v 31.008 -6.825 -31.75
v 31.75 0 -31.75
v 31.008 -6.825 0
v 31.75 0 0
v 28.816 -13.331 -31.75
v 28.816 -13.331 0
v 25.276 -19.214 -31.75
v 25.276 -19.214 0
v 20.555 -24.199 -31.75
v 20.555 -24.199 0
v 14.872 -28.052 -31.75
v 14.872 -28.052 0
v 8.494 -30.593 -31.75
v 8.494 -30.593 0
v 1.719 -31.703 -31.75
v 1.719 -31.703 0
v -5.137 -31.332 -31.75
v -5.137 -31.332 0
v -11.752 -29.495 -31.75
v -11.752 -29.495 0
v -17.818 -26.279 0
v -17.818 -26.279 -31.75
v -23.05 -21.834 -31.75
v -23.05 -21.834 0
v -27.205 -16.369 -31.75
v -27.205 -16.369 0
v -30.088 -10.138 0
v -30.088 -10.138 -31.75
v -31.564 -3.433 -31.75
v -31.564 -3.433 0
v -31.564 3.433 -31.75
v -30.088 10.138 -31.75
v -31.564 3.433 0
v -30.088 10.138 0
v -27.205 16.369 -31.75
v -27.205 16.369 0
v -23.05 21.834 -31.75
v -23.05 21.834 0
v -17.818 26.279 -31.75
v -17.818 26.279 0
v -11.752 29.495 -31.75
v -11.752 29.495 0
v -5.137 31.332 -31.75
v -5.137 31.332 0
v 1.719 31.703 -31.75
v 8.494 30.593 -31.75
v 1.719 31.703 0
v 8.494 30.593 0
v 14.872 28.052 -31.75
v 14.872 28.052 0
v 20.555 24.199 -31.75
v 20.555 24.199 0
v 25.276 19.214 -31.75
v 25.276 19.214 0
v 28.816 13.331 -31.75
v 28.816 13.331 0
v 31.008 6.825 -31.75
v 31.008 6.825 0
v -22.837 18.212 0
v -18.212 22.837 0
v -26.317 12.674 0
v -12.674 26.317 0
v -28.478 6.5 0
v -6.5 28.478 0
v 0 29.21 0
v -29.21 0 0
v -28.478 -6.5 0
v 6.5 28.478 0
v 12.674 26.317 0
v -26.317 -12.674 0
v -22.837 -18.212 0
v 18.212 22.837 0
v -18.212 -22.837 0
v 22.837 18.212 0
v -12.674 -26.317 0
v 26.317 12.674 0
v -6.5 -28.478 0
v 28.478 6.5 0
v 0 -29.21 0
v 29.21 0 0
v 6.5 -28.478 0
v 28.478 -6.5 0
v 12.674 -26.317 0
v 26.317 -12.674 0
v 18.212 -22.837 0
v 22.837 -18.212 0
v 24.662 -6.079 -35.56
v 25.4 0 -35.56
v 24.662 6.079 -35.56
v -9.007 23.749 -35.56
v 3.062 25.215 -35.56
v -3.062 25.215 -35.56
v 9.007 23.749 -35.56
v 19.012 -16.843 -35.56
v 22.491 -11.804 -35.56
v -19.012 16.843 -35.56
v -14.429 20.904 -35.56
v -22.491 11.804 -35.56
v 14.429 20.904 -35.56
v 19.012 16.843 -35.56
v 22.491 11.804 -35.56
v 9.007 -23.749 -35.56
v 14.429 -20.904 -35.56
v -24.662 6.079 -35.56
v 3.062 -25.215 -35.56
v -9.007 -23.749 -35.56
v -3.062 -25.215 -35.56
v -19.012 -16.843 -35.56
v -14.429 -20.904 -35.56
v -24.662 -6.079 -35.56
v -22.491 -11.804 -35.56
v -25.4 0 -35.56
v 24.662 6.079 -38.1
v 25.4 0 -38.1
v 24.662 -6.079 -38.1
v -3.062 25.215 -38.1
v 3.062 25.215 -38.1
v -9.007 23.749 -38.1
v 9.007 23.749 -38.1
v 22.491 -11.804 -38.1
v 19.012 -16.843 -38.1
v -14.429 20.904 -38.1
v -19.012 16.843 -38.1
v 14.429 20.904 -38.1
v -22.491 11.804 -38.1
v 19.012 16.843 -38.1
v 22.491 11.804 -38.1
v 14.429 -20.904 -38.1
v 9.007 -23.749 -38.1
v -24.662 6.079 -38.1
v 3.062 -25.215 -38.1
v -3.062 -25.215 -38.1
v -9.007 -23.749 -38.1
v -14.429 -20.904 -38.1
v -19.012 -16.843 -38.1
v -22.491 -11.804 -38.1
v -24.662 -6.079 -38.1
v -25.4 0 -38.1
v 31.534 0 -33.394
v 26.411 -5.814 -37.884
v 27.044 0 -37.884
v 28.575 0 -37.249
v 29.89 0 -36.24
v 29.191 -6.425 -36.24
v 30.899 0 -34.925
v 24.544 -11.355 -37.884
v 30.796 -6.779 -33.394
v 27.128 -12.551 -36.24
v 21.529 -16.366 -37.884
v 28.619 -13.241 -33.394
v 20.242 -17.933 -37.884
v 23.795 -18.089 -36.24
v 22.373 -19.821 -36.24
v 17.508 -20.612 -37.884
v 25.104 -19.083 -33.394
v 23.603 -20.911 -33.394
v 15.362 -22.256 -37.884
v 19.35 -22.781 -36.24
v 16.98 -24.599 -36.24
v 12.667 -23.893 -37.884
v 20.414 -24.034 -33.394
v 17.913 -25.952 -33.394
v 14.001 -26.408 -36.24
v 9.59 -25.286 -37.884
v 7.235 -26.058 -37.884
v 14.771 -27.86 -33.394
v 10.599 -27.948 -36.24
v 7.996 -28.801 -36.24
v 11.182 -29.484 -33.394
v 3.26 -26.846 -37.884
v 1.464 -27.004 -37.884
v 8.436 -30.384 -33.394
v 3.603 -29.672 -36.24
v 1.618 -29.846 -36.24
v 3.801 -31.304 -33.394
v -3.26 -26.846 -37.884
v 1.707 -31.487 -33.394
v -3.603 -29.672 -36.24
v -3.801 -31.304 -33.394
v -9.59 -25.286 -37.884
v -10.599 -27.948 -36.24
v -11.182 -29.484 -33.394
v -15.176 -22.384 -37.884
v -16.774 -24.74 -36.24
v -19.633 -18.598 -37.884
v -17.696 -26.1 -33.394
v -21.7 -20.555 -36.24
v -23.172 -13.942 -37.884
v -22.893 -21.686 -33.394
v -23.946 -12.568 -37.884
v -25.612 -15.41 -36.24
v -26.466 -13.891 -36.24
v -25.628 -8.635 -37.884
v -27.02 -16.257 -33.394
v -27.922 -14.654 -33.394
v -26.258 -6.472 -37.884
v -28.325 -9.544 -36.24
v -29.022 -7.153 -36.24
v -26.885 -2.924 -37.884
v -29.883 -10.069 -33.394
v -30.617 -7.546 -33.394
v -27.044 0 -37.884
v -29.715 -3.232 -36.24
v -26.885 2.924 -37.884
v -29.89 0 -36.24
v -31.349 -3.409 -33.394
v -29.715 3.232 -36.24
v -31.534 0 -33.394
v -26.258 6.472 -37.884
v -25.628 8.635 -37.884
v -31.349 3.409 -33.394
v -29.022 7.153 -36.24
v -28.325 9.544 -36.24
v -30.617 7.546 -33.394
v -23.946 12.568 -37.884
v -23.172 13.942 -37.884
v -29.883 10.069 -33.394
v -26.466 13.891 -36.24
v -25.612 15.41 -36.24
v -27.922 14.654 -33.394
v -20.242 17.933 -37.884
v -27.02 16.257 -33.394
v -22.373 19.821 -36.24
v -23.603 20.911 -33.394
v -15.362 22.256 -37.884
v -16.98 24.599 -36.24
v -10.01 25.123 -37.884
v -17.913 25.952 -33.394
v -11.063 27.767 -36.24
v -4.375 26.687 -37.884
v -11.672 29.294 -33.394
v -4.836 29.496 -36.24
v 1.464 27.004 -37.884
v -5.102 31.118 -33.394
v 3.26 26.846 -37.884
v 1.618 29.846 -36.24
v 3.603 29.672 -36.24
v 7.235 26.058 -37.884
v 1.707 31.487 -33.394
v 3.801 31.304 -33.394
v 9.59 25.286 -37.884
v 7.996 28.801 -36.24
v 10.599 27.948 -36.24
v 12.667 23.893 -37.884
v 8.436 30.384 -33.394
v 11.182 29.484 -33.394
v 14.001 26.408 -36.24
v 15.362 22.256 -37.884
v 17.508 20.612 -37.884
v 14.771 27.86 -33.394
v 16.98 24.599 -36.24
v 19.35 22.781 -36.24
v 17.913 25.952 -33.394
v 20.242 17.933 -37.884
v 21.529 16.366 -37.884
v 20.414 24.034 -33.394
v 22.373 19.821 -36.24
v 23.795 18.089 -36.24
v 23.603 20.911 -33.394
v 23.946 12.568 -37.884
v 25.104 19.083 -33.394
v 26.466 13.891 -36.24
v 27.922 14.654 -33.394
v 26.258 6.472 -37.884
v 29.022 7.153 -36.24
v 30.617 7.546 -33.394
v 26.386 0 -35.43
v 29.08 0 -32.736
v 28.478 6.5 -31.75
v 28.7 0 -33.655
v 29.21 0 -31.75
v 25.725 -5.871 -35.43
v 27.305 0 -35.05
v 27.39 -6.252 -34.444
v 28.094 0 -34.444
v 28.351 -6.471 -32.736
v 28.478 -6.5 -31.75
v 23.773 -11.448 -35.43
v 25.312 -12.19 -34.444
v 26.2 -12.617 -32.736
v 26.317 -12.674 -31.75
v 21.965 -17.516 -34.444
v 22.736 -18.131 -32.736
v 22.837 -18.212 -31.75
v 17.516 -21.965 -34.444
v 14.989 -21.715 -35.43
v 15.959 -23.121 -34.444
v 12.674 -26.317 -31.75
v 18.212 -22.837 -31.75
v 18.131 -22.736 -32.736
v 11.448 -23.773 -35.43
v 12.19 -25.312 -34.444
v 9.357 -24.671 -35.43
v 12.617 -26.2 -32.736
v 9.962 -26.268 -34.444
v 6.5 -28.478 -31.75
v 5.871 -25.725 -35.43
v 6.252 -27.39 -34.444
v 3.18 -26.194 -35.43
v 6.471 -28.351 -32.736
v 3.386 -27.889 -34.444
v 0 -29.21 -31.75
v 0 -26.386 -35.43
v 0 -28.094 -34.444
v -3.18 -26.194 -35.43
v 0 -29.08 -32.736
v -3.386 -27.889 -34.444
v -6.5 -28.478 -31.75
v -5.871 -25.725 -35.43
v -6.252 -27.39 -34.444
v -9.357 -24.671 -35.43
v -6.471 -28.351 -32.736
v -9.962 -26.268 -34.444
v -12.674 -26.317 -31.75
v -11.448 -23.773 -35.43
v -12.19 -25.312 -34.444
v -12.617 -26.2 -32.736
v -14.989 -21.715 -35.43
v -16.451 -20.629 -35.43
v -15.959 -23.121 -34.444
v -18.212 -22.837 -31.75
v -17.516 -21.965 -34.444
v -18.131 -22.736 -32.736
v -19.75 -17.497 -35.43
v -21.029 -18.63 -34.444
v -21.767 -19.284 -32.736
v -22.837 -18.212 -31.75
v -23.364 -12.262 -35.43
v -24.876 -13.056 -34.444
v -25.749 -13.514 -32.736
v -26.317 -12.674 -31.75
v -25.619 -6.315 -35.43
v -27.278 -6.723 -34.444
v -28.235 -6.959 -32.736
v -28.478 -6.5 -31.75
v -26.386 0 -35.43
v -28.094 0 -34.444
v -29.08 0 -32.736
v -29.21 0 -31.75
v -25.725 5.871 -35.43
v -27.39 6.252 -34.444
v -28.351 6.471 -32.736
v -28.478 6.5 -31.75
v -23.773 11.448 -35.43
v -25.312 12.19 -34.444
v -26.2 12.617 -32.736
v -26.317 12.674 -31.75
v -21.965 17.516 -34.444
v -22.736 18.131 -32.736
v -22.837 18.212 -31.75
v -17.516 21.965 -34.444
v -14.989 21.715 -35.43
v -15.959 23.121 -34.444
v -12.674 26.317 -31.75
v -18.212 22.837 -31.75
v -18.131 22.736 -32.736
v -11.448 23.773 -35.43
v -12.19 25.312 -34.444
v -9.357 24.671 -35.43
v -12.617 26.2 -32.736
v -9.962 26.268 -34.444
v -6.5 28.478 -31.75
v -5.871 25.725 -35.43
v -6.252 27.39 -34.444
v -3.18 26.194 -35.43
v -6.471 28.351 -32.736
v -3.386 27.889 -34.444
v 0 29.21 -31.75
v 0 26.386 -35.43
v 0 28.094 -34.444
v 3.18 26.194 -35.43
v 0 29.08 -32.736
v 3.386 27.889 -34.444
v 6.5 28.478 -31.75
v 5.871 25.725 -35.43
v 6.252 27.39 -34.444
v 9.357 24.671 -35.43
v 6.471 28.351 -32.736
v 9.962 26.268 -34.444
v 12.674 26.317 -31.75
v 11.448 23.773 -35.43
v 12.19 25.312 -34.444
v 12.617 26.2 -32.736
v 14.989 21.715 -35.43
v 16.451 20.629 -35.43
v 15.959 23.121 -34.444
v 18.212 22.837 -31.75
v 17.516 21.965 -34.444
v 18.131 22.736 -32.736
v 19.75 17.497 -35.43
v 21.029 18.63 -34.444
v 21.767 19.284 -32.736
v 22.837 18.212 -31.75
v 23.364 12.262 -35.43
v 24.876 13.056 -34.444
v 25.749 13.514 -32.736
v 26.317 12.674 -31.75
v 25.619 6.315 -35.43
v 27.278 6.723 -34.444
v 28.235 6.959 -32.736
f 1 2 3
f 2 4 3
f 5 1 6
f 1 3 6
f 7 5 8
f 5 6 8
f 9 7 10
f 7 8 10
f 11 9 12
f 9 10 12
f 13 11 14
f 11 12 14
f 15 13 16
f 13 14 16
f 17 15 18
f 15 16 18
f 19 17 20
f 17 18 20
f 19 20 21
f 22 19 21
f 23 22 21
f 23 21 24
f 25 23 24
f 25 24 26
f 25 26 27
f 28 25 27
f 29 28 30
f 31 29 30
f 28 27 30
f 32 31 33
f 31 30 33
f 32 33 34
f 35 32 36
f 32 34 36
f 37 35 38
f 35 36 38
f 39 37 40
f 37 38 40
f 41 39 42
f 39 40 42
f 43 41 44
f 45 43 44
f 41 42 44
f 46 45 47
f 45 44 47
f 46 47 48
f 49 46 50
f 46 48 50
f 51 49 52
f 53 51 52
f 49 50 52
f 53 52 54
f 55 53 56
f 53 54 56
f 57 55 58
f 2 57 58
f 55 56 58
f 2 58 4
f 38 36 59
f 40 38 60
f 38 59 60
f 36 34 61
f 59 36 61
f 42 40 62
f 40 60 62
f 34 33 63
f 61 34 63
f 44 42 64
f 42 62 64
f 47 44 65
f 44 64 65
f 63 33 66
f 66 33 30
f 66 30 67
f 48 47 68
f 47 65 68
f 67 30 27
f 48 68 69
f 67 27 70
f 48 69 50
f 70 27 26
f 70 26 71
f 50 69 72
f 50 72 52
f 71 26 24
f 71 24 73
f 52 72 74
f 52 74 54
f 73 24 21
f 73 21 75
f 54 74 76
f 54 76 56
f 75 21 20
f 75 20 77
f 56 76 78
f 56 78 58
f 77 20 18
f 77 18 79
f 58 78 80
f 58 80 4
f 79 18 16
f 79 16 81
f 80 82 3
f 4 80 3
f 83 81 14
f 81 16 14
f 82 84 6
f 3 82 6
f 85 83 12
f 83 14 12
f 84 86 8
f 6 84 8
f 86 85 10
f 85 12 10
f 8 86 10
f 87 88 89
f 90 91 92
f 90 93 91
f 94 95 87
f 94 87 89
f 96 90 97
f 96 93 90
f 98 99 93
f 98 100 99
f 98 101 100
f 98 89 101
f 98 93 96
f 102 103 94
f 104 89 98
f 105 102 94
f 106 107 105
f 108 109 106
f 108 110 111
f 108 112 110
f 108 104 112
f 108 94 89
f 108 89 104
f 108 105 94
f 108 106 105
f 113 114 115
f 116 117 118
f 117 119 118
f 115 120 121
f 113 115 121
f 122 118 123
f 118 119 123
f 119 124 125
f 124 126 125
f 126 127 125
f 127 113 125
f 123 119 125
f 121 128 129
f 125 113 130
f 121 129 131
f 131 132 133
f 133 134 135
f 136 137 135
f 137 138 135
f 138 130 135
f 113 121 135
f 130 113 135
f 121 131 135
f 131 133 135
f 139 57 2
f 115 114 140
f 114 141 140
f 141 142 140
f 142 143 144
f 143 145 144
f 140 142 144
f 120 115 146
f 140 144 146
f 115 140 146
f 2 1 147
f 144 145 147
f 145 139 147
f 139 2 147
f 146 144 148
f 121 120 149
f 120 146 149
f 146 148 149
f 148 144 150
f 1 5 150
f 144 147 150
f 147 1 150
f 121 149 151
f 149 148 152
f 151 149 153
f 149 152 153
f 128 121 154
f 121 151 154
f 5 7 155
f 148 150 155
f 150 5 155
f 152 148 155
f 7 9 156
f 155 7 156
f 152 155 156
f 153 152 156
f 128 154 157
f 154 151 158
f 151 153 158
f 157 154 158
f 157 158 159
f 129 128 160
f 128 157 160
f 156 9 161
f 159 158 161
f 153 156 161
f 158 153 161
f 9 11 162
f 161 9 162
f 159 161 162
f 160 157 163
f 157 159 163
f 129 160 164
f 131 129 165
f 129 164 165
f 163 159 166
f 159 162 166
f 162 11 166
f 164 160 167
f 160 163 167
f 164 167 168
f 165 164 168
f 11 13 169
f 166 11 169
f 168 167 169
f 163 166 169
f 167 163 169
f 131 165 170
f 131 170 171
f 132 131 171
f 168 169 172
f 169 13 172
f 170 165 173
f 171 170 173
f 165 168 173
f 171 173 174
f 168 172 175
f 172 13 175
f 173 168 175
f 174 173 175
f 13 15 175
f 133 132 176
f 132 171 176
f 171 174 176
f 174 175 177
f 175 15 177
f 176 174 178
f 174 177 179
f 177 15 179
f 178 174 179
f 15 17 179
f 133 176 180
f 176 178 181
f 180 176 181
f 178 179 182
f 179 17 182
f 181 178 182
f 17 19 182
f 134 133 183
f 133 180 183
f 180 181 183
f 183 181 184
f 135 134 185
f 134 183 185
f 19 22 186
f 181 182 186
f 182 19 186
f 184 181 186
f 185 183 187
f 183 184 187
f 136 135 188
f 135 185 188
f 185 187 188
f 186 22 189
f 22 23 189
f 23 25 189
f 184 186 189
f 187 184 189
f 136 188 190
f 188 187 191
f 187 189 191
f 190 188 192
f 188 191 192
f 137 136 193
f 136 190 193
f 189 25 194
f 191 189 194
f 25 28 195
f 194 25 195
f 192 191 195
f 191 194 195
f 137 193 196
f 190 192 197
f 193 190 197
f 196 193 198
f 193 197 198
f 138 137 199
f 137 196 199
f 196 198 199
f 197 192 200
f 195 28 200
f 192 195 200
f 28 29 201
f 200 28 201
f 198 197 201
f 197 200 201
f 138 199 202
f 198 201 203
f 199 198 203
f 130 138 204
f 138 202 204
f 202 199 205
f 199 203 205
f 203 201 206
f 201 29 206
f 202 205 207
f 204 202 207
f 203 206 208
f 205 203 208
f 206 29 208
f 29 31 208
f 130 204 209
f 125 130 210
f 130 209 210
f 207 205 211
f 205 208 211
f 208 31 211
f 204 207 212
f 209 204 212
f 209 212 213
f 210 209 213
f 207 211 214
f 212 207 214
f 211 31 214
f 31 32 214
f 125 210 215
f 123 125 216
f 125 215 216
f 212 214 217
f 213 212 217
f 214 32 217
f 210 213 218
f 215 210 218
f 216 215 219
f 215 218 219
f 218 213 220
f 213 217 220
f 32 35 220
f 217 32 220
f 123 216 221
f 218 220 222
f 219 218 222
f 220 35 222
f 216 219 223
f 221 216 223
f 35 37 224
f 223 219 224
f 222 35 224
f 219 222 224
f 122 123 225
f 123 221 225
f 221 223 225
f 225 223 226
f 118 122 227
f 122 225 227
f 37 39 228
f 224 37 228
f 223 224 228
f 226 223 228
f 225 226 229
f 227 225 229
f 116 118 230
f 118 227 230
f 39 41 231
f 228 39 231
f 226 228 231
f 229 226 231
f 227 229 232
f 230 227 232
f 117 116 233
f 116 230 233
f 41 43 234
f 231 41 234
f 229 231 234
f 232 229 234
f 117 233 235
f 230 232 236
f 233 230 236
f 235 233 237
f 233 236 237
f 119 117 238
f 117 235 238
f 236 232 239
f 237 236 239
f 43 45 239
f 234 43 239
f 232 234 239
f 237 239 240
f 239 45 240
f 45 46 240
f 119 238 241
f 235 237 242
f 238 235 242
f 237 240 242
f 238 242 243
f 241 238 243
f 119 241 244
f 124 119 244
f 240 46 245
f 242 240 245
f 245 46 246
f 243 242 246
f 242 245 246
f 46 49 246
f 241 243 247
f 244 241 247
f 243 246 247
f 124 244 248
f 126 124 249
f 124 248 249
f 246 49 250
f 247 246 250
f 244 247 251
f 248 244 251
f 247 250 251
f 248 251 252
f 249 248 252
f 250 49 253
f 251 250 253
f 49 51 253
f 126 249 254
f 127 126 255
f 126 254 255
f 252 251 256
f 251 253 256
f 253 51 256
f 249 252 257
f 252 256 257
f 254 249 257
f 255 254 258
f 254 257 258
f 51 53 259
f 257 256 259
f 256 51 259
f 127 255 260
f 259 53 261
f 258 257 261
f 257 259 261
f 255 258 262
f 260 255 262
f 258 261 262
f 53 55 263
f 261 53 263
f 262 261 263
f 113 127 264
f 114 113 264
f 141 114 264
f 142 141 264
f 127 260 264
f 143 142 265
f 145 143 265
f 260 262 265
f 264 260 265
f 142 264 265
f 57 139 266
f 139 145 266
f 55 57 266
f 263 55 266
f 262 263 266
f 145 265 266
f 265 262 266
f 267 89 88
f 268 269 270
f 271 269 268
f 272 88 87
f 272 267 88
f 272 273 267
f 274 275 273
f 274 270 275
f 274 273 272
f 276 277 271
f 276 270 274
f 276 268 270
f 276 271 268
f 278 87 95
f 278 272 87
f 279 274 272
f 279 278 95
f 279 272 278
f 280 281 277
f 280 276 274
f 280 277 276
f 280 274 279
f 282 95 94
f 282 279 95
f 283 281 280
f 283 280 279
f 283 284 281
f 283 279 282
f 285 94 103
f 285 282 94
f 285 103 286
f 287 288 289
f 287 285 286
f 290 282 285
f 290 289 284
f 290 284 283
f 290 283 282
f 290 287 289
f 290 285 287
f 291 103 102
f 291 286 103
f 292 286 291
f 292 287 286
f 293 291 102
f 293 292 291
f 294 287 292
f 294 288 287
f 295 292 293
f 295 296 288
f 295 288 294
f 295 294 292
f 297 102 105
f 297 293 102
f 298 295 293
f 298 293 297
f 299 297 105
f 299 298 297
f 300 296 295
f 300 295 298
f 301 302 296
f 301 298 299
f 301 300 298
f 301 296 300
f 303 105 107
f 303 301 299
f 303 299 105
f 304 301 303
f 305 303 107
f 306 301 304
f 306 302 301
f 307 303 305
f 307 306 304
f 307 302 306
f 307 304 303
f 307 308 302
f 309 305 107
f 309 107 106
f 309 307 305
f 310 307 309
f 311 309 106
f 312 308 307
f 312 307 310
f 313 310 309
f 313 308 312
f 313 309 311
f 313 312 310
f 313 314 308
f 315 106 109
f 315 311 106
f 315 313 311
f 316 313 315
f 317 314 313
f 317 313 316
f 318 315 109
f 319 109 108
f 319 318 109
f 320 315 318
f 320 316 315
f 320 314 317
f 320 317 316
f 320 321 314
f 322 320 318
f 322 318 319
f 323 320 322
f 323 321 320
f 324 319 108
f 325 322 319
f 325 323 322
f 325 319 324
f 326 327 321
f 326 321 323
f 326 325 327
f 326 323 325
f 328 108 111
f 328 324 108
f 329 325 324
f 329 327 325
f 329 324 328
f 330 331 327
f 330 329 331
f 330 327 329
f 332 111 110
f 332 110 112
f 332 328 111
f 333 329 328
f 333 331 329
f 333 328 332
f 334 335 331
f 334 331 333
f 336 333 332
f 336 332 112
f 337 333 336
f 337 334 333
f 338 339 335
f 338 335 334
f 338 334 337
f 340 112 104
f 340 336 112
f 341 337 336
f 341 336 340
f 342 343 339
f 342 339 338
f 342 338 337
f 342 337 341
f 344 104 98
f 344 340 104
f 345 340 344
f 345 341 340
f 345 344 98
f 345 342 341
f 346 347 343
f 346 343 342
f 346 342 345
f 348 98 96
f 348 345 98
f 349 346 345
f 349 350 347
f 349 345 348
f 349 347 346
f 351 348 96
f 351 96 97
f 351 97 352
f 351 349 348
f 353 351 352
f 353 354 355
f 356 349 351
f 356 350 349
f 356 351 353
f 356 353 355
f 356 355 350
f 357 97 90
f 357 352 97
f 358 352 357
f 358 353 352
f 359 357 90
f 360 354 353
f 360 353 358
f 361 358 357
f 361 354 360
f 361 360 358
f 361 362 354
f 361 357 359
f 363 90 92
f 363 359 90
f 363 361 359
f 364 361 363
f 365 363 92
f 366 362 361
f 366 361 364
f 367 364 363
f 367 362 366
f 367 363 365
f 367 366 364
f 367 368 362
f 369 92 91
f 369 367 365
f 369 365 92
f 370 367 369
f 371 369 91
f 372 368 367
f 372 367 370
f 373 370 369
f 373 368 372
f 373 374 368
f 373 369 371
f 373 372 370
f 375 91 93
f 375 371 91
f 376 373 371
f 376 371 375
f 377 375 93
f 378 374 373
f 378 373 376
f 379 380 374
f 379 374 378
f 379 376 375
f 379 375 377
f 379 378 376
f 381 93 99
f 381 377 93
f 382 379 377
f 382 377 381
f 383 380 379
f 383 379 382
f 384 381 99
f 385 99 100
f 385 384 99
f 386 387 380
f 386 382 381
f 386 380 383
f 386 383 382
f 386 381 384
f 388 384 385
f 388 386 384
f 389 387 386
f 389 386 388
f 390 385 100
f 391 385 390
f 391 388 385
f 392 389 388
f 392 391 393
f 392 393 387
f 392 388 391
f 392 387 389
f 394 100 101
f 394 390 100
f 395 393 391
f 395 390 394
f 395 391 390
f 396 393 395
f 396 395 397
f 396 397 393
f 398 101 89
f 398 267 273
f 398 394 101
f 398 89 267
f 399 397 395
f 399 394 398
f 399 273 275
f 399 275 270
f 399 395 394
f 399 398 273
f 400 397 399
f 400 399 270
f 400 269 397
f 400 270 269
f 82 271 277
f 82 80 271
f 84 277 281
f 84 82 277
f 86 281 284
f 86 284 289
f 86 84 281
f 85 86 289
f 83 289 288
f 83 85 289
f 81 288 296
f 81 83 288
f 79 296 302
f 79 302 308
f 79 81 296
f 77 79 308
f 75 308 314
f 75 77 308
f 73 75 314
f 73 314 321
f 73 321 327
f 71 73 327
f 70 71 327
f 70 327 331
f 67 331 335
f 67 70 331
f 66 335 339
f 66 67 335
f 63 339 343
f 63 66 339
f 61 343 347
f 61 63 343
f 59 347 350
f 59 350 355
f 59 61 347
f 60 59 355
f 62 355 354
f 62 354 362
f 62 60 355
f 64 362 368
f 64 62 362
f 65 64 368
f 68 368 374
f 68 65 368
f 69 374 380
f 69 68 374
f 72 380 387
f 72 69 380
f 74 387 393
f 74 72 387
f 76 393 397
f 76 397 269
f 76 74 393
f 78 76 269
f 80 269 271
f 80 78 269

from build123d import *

# Parameters (mm, degrees)
F2_T = -2.54


with BuildPart() as f1:
    # F0 (on Front) → F1 (revolve)
    with BuildSketch(Plane.XZ):
        with BuildLine():
            Line((31.75, 0), (0, 0))
            Line((0, 0), (0, -38.1))
            Line((0, -38.1), (25.4, -38.1))
            ThreePointArc((25.4, -38.1), (29.890128, -36.240128), (31.75, -31.75))
            Line((31.75, -31.75), (31.75, 0))
        make_face()
    revolve(axis=Axis((0, 0, -6.767765), (0, 0, -1)))

    # F2
    f2_openings = [f1.faces().sort_by_distance(p)[0] for p in [
        (0, 0, 0),
    ]]
    offset(amount=F2_T, openings=f2_openings)


solid = f1.part
